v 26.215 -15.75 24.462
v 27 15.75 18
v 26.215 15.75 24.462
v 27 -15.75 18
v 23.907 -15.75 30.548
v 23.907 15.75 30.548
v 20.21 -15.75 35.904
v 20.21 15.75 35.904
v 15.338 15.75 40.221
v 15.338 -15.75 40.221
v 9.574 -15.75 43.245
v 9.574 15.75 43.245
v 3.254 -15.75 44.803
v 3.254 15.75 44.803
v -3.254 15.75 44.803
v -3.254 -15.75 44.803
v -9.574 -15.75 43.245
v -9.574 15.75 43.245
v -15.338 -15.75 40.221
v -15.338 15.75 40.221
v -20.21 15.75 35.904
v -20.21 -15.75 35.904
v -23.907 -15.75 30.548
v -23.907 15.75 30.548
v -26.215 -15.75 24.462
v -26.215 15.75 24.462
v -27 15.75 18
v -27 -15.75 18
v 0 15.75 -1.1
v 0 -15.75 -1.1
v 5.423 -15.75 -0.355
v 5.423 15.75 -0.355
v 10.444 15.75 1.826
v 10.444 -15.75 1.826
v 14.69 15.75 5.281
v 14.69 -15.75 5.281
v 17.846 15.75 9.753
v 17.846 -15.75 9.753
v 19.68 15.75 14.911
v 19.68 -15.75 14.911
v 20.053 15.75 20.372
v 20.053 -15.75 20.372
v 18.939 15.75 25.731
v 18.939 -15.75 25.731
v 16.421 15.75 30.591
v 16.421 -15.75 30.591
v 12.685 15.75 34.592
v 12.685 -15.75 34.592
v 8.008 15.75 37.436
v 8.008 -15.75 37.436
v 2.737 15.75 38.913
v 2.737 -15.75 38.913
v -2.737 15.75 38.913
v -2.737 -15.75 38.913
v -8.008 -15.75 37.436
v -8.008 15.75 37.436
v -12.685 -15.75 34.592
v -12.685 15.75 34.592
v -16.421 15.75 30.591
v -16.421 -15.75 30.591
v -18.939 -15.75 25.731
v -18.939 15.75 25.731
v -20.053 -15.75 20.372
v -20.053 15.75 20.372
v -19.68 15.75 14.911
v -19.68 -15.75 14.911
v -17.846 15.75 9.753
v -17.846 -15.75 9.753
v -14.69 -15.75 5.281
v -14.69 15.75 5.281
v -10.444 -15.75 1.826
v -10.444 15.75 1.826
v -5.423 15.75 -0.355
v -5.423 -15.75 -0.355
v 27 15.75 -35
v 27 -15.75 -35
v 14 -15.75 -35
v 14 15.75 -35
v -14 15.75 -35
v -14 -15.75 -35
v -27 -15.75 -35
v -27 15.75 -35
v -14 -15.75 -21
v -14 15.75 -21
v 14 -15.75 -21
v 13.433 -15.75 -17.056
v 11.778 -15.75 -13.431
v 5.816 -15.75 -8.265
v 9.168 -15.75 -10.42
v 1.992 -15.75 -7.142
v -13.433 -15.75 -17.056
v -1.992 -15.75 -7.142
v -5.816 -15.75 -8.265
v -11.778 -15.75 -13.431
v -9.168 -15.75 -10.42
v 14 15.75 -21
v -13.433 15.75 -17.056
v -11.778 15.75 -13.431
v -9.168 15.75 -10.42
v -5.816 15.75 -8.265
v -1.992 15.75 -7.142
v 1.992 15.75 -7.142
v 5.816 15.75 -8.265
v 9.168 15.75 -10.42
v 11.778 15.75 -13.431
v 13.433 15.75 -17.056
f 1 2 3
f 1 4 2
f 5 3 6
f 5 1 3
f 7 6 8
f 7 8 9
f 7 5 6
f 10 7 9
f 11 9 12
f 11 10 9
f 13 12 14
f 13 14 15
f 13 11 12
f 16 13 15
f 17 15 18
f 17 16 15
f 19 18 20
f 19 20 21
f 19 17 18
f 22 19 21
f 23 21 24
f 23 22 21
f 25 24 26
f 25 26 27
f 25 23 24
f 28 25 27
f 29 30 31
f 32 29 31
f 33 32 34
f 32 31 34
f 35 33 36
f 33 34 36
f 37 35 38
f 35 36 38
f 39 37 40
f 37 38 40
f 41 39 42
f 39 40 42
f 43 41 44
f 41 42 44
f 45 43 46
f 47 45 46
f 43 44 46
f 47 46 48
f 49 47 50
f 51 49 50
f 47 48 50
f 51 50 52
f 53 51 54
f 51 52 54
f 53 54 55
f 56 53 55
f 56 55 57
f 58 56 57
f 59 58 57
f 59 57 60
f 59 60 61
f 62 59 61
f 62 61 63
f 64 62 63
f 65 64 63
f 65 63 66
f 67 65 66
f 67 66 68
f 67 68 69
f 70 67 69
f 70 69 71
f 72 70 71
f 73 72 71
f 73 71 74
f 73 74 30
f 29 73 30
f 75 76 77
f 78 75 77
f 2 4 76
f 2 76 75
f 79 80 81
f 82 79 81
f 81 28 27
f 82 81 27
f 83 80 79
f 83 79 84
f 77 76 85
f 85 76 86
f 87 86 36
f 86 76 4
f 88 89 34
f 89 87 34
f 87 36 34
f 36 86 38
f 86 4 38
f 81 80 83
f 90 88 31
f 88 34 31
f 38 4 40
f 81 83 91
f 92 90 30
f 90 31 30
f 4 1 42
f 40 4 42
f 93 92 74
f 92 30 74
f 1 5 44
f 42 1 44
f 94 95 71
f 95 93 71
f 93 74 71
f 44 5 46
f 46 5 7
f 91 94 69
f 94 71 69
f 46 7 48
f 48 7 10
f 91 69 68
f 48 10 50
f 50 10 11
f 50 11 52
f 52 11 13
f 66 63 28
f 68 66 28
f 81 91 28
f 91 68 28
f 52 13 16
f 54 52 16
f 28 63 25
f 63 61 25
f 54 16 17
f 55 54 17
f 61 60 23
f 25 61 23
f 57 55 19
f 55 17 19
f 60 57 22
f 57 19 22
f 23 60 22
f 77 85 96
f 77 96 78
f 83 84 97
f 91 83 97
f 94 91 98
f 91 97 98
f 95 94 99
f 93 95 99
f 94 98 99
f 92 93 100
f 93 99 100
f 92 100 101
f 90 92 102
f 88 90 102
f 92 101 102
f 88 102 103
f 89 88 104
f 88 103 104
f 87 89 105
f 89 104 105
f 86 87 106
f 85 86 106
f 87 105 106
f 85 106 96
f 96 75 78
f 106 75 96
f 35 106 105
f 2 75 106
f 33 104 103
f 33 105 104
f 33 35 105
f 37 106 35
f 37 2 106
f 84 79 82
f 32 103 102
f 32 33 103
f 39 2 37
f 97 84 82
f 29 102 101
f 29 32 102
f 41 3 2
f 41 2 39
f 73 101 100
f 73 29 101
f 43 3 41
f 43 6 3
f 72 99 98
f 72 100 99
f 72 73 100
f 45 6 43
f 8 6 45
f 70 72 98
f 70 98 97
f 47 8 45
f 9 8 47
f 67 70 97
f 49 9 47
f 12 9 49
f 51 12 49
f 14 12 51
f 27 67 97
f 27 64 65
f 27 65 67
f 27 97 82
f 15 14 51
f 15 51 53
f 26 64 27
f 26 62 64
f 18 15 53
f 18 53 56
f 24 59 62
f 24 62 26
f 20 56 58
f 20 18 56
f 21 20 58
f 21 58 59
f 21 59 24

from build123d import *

# Parameters (mm, degrees)
SZKIC1_W                    = 54
SZKIC1_H                    = 31.5
DODANIE_WYCI_GNI_CIE1_DEPTH = 45
SZKIC2_W                    = 54
SZKIC2_H                    = 31.5
DODANIE_WYCI_GNI_CIE2_DEPTH = 35
WYTNIJ_WYCI_GNI_CIE3_REACH  = 63.207
ZAOKR_GLENIE1_RADIUS        = 27
ZAOKR_GLENIE1_LENGTH        = 31.5
SZKIC9_R                    = 20.1
WYTNIJ_WYCI_GNI_CIE4_DEPTH  = 62.206617289


with BuildPart() as part:
    # Szkic1 → Dodanie-wyciągnięcie1 (new body)
    with BuildSketch(Plane.XY):
        Rectangle(SZKIC1_W, SZKIC1_H)
    extrude(amount=DODANIE_WYCI_GNI_CIE1_DEPTH)

    # Szkic2 → Dodanie-wyciągnięcie2 (add)
    with BuildSketch(Plane(origin=(0, 0, 0), x_dir=(-1, 0, 0), z_dir=(0, 0, -1))):
        Rectangle(SZKIC2_W, SZKIC2_H)
    extrude(amount=DODANIE_WYCI_GNI_CIE2_DEPTH)

    # Szkic8 → Wytnij-wyciągnięcie3 (cut, up to next)
    with BuildSketch(Plane(origin=(0, 15.75, 0), x_dir=(1, 0, 0), z_dir=(0, 1, 0)), mode=Mode.PRIVATE) as wytnij_wyci_gni_cie3_sk1:
        with BuildLine():
            Line((14, 35), (-14, 35))
            Line((-14, 35), (-14, 21))
            ThreePointArc((-14, 21), (0, 7), (14, 21))
            Line((14, 21), (14, 35))
        make_face()
    wytnij_wyci_gni_cie3_tool1 = extrude(wytnij_wyci_gni_cie3_sk1.sketch, amount=-WYTNIJ_WYCI_GNI_CIE3_REACH, mode=Mode.PRIVATE) & part.part
    add(wytnij_wyci_gni_cie3_tool1.solids().sort_by_distance((0, 15.75, -22.306898))[0], mode=Mode.SUBTRACT)

    # Zaokrąglenie1: full round fillet: the end face becomes a half cylinder, R = half its width
    zaokr_glenie1_face = Plane((0, 0, 45), x_dir=(0, -1, 0), z_dir=(0, 0, 1))  # on the end face: x along it, z out of the body
    zaokr_glenie1_slab = zaokr_glenie1_face.offset(-ZAOKR_GLENIE1_RADIUS / 2) * Box(ZAOKR_GLENIE1_LENGTH, 2 * ZAOKR_GLENIE1_RADIUS, ZAOKR_GLENIE1_RADIUS, mode=Mode.PRIVATE)  # the body's end, R deep
    zaokr_glenie1_round = Plane((0, 0, 18), x_dir=(0, 0, 1), z_dir=(0, -1, 0)) * Cylinder(ZAOKR_GLENIE1_RADIUS, ZAOKR_GLENIE1_LENGTH, mode=Mode.PRIVATE)  # its axis R under the face
    add(zaokr_glenie1_slab - zaokr_glenie1_round, mode=Mode.SUBTRACT)

    # Szkic9 → Wytnij-wyciągnięcie4 (cut, through all)
    with BuildSketch(Plane(origin=(0, -15.75, 0), x_dir=(-1, 0, 0), z_dir=(0, -1, 0))):
        with Locations(Location((0, -19, 0), (0, 0, 90))):
            Circle(SZKIC9_R)
    extrude(amount=-WYTNIJ_WYCI_GNI_CIE4_DEPTH, mode=Mode.SUBTRACT)


solid = part.part
